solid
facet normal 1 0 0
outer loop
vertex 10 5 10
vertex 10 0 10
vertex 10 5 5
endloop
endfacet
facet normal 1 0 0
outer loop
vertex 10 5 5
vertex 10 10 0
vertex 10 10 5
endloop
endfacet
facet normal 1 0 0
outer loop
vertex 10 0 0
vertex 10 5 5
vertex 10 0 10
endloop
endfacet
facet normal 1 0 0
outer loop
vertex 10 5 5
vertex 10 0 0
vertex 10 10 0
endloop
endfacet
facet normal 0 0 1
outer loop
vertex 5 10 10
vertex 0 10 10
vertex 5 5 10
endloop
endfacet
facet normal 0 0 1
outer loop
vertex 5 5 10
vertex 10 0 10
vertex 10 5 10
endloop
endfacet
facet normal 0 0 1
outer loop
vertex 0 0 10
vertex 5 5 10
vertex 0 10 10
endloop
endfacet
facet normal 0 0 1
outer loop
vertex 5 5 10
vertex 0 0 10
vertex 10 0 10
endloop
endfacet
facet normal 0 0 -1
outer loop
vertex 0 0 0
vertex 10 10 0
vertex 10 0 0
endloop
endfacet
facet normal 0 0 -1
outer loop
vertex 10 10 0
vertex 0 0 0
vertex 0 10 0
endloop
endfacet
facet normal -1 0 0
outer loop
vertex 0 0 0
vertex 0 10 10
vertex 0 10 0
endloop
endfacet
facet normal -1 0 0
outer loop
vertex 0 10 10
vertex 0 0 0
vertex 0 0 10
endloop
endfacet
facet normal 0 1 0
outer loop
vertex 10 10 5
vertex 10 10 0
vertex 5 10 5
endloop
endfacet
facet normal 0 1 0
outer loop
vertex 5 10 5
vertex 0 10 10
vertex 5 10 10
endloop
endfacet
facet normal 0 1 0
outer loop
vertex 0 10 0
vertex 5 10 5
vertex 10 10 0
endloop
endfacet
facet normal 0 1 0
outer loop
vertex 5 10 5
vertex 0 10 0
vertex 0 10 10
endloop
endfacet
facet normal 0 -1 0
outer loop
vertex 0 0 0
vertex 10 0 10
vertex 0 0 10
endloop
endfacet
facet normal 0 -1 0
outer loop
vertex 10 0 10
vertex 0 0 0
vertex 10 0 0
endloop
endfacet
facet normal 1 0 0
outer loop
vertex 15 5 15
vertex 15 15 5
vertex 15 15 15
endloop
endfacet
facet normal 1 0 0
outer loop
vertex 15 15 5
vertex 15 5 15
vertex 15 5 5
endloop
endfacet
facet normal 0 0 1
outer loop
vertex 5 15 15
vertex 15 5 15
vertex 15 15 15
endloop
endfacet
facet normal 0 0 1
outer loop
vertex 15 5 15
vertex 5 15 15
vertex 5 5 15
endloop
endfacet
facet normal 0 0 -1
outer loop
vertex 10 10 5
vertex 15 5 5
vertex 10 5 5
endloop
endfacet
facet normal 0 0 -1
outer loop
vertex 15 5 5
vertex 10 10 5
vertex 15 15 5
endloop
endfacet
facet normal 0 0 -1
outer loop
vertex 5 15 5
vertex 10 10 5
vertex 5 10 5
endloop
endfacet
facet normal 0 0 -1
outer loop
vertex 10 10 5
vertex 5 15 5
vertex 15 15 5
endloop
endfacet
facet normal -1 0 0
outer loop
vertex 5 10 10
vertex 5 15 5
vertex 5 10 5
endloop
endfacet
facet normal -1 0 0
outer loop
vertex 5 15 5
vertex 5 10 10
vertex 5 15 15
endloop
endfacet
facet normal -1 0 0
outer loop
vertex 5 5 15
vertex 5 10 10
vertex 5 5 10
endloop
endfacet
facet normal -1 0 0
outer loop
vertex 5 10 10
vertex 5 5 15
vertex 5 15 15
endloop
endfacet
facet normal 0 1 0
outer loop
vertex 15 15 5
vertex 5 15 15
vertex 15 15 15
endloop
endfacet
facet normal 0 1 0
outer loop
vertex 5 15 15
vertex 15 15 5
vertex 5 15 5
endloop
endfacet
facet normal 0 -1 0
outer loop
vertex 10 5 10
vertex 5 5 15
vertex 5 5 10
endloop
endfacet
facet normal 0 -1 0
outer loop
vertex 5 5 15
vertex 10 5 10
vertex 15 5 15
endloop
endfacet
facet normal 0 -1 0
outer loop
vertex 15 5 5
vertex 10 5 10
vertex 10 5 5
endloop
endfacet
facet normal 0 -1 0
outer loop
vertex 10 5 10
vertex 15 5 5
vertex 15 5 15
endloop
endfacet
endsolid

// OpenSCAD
// Union of two cubes
union() {
    cube(10);
    translate([5, 5, 5]) cube(10);
}
